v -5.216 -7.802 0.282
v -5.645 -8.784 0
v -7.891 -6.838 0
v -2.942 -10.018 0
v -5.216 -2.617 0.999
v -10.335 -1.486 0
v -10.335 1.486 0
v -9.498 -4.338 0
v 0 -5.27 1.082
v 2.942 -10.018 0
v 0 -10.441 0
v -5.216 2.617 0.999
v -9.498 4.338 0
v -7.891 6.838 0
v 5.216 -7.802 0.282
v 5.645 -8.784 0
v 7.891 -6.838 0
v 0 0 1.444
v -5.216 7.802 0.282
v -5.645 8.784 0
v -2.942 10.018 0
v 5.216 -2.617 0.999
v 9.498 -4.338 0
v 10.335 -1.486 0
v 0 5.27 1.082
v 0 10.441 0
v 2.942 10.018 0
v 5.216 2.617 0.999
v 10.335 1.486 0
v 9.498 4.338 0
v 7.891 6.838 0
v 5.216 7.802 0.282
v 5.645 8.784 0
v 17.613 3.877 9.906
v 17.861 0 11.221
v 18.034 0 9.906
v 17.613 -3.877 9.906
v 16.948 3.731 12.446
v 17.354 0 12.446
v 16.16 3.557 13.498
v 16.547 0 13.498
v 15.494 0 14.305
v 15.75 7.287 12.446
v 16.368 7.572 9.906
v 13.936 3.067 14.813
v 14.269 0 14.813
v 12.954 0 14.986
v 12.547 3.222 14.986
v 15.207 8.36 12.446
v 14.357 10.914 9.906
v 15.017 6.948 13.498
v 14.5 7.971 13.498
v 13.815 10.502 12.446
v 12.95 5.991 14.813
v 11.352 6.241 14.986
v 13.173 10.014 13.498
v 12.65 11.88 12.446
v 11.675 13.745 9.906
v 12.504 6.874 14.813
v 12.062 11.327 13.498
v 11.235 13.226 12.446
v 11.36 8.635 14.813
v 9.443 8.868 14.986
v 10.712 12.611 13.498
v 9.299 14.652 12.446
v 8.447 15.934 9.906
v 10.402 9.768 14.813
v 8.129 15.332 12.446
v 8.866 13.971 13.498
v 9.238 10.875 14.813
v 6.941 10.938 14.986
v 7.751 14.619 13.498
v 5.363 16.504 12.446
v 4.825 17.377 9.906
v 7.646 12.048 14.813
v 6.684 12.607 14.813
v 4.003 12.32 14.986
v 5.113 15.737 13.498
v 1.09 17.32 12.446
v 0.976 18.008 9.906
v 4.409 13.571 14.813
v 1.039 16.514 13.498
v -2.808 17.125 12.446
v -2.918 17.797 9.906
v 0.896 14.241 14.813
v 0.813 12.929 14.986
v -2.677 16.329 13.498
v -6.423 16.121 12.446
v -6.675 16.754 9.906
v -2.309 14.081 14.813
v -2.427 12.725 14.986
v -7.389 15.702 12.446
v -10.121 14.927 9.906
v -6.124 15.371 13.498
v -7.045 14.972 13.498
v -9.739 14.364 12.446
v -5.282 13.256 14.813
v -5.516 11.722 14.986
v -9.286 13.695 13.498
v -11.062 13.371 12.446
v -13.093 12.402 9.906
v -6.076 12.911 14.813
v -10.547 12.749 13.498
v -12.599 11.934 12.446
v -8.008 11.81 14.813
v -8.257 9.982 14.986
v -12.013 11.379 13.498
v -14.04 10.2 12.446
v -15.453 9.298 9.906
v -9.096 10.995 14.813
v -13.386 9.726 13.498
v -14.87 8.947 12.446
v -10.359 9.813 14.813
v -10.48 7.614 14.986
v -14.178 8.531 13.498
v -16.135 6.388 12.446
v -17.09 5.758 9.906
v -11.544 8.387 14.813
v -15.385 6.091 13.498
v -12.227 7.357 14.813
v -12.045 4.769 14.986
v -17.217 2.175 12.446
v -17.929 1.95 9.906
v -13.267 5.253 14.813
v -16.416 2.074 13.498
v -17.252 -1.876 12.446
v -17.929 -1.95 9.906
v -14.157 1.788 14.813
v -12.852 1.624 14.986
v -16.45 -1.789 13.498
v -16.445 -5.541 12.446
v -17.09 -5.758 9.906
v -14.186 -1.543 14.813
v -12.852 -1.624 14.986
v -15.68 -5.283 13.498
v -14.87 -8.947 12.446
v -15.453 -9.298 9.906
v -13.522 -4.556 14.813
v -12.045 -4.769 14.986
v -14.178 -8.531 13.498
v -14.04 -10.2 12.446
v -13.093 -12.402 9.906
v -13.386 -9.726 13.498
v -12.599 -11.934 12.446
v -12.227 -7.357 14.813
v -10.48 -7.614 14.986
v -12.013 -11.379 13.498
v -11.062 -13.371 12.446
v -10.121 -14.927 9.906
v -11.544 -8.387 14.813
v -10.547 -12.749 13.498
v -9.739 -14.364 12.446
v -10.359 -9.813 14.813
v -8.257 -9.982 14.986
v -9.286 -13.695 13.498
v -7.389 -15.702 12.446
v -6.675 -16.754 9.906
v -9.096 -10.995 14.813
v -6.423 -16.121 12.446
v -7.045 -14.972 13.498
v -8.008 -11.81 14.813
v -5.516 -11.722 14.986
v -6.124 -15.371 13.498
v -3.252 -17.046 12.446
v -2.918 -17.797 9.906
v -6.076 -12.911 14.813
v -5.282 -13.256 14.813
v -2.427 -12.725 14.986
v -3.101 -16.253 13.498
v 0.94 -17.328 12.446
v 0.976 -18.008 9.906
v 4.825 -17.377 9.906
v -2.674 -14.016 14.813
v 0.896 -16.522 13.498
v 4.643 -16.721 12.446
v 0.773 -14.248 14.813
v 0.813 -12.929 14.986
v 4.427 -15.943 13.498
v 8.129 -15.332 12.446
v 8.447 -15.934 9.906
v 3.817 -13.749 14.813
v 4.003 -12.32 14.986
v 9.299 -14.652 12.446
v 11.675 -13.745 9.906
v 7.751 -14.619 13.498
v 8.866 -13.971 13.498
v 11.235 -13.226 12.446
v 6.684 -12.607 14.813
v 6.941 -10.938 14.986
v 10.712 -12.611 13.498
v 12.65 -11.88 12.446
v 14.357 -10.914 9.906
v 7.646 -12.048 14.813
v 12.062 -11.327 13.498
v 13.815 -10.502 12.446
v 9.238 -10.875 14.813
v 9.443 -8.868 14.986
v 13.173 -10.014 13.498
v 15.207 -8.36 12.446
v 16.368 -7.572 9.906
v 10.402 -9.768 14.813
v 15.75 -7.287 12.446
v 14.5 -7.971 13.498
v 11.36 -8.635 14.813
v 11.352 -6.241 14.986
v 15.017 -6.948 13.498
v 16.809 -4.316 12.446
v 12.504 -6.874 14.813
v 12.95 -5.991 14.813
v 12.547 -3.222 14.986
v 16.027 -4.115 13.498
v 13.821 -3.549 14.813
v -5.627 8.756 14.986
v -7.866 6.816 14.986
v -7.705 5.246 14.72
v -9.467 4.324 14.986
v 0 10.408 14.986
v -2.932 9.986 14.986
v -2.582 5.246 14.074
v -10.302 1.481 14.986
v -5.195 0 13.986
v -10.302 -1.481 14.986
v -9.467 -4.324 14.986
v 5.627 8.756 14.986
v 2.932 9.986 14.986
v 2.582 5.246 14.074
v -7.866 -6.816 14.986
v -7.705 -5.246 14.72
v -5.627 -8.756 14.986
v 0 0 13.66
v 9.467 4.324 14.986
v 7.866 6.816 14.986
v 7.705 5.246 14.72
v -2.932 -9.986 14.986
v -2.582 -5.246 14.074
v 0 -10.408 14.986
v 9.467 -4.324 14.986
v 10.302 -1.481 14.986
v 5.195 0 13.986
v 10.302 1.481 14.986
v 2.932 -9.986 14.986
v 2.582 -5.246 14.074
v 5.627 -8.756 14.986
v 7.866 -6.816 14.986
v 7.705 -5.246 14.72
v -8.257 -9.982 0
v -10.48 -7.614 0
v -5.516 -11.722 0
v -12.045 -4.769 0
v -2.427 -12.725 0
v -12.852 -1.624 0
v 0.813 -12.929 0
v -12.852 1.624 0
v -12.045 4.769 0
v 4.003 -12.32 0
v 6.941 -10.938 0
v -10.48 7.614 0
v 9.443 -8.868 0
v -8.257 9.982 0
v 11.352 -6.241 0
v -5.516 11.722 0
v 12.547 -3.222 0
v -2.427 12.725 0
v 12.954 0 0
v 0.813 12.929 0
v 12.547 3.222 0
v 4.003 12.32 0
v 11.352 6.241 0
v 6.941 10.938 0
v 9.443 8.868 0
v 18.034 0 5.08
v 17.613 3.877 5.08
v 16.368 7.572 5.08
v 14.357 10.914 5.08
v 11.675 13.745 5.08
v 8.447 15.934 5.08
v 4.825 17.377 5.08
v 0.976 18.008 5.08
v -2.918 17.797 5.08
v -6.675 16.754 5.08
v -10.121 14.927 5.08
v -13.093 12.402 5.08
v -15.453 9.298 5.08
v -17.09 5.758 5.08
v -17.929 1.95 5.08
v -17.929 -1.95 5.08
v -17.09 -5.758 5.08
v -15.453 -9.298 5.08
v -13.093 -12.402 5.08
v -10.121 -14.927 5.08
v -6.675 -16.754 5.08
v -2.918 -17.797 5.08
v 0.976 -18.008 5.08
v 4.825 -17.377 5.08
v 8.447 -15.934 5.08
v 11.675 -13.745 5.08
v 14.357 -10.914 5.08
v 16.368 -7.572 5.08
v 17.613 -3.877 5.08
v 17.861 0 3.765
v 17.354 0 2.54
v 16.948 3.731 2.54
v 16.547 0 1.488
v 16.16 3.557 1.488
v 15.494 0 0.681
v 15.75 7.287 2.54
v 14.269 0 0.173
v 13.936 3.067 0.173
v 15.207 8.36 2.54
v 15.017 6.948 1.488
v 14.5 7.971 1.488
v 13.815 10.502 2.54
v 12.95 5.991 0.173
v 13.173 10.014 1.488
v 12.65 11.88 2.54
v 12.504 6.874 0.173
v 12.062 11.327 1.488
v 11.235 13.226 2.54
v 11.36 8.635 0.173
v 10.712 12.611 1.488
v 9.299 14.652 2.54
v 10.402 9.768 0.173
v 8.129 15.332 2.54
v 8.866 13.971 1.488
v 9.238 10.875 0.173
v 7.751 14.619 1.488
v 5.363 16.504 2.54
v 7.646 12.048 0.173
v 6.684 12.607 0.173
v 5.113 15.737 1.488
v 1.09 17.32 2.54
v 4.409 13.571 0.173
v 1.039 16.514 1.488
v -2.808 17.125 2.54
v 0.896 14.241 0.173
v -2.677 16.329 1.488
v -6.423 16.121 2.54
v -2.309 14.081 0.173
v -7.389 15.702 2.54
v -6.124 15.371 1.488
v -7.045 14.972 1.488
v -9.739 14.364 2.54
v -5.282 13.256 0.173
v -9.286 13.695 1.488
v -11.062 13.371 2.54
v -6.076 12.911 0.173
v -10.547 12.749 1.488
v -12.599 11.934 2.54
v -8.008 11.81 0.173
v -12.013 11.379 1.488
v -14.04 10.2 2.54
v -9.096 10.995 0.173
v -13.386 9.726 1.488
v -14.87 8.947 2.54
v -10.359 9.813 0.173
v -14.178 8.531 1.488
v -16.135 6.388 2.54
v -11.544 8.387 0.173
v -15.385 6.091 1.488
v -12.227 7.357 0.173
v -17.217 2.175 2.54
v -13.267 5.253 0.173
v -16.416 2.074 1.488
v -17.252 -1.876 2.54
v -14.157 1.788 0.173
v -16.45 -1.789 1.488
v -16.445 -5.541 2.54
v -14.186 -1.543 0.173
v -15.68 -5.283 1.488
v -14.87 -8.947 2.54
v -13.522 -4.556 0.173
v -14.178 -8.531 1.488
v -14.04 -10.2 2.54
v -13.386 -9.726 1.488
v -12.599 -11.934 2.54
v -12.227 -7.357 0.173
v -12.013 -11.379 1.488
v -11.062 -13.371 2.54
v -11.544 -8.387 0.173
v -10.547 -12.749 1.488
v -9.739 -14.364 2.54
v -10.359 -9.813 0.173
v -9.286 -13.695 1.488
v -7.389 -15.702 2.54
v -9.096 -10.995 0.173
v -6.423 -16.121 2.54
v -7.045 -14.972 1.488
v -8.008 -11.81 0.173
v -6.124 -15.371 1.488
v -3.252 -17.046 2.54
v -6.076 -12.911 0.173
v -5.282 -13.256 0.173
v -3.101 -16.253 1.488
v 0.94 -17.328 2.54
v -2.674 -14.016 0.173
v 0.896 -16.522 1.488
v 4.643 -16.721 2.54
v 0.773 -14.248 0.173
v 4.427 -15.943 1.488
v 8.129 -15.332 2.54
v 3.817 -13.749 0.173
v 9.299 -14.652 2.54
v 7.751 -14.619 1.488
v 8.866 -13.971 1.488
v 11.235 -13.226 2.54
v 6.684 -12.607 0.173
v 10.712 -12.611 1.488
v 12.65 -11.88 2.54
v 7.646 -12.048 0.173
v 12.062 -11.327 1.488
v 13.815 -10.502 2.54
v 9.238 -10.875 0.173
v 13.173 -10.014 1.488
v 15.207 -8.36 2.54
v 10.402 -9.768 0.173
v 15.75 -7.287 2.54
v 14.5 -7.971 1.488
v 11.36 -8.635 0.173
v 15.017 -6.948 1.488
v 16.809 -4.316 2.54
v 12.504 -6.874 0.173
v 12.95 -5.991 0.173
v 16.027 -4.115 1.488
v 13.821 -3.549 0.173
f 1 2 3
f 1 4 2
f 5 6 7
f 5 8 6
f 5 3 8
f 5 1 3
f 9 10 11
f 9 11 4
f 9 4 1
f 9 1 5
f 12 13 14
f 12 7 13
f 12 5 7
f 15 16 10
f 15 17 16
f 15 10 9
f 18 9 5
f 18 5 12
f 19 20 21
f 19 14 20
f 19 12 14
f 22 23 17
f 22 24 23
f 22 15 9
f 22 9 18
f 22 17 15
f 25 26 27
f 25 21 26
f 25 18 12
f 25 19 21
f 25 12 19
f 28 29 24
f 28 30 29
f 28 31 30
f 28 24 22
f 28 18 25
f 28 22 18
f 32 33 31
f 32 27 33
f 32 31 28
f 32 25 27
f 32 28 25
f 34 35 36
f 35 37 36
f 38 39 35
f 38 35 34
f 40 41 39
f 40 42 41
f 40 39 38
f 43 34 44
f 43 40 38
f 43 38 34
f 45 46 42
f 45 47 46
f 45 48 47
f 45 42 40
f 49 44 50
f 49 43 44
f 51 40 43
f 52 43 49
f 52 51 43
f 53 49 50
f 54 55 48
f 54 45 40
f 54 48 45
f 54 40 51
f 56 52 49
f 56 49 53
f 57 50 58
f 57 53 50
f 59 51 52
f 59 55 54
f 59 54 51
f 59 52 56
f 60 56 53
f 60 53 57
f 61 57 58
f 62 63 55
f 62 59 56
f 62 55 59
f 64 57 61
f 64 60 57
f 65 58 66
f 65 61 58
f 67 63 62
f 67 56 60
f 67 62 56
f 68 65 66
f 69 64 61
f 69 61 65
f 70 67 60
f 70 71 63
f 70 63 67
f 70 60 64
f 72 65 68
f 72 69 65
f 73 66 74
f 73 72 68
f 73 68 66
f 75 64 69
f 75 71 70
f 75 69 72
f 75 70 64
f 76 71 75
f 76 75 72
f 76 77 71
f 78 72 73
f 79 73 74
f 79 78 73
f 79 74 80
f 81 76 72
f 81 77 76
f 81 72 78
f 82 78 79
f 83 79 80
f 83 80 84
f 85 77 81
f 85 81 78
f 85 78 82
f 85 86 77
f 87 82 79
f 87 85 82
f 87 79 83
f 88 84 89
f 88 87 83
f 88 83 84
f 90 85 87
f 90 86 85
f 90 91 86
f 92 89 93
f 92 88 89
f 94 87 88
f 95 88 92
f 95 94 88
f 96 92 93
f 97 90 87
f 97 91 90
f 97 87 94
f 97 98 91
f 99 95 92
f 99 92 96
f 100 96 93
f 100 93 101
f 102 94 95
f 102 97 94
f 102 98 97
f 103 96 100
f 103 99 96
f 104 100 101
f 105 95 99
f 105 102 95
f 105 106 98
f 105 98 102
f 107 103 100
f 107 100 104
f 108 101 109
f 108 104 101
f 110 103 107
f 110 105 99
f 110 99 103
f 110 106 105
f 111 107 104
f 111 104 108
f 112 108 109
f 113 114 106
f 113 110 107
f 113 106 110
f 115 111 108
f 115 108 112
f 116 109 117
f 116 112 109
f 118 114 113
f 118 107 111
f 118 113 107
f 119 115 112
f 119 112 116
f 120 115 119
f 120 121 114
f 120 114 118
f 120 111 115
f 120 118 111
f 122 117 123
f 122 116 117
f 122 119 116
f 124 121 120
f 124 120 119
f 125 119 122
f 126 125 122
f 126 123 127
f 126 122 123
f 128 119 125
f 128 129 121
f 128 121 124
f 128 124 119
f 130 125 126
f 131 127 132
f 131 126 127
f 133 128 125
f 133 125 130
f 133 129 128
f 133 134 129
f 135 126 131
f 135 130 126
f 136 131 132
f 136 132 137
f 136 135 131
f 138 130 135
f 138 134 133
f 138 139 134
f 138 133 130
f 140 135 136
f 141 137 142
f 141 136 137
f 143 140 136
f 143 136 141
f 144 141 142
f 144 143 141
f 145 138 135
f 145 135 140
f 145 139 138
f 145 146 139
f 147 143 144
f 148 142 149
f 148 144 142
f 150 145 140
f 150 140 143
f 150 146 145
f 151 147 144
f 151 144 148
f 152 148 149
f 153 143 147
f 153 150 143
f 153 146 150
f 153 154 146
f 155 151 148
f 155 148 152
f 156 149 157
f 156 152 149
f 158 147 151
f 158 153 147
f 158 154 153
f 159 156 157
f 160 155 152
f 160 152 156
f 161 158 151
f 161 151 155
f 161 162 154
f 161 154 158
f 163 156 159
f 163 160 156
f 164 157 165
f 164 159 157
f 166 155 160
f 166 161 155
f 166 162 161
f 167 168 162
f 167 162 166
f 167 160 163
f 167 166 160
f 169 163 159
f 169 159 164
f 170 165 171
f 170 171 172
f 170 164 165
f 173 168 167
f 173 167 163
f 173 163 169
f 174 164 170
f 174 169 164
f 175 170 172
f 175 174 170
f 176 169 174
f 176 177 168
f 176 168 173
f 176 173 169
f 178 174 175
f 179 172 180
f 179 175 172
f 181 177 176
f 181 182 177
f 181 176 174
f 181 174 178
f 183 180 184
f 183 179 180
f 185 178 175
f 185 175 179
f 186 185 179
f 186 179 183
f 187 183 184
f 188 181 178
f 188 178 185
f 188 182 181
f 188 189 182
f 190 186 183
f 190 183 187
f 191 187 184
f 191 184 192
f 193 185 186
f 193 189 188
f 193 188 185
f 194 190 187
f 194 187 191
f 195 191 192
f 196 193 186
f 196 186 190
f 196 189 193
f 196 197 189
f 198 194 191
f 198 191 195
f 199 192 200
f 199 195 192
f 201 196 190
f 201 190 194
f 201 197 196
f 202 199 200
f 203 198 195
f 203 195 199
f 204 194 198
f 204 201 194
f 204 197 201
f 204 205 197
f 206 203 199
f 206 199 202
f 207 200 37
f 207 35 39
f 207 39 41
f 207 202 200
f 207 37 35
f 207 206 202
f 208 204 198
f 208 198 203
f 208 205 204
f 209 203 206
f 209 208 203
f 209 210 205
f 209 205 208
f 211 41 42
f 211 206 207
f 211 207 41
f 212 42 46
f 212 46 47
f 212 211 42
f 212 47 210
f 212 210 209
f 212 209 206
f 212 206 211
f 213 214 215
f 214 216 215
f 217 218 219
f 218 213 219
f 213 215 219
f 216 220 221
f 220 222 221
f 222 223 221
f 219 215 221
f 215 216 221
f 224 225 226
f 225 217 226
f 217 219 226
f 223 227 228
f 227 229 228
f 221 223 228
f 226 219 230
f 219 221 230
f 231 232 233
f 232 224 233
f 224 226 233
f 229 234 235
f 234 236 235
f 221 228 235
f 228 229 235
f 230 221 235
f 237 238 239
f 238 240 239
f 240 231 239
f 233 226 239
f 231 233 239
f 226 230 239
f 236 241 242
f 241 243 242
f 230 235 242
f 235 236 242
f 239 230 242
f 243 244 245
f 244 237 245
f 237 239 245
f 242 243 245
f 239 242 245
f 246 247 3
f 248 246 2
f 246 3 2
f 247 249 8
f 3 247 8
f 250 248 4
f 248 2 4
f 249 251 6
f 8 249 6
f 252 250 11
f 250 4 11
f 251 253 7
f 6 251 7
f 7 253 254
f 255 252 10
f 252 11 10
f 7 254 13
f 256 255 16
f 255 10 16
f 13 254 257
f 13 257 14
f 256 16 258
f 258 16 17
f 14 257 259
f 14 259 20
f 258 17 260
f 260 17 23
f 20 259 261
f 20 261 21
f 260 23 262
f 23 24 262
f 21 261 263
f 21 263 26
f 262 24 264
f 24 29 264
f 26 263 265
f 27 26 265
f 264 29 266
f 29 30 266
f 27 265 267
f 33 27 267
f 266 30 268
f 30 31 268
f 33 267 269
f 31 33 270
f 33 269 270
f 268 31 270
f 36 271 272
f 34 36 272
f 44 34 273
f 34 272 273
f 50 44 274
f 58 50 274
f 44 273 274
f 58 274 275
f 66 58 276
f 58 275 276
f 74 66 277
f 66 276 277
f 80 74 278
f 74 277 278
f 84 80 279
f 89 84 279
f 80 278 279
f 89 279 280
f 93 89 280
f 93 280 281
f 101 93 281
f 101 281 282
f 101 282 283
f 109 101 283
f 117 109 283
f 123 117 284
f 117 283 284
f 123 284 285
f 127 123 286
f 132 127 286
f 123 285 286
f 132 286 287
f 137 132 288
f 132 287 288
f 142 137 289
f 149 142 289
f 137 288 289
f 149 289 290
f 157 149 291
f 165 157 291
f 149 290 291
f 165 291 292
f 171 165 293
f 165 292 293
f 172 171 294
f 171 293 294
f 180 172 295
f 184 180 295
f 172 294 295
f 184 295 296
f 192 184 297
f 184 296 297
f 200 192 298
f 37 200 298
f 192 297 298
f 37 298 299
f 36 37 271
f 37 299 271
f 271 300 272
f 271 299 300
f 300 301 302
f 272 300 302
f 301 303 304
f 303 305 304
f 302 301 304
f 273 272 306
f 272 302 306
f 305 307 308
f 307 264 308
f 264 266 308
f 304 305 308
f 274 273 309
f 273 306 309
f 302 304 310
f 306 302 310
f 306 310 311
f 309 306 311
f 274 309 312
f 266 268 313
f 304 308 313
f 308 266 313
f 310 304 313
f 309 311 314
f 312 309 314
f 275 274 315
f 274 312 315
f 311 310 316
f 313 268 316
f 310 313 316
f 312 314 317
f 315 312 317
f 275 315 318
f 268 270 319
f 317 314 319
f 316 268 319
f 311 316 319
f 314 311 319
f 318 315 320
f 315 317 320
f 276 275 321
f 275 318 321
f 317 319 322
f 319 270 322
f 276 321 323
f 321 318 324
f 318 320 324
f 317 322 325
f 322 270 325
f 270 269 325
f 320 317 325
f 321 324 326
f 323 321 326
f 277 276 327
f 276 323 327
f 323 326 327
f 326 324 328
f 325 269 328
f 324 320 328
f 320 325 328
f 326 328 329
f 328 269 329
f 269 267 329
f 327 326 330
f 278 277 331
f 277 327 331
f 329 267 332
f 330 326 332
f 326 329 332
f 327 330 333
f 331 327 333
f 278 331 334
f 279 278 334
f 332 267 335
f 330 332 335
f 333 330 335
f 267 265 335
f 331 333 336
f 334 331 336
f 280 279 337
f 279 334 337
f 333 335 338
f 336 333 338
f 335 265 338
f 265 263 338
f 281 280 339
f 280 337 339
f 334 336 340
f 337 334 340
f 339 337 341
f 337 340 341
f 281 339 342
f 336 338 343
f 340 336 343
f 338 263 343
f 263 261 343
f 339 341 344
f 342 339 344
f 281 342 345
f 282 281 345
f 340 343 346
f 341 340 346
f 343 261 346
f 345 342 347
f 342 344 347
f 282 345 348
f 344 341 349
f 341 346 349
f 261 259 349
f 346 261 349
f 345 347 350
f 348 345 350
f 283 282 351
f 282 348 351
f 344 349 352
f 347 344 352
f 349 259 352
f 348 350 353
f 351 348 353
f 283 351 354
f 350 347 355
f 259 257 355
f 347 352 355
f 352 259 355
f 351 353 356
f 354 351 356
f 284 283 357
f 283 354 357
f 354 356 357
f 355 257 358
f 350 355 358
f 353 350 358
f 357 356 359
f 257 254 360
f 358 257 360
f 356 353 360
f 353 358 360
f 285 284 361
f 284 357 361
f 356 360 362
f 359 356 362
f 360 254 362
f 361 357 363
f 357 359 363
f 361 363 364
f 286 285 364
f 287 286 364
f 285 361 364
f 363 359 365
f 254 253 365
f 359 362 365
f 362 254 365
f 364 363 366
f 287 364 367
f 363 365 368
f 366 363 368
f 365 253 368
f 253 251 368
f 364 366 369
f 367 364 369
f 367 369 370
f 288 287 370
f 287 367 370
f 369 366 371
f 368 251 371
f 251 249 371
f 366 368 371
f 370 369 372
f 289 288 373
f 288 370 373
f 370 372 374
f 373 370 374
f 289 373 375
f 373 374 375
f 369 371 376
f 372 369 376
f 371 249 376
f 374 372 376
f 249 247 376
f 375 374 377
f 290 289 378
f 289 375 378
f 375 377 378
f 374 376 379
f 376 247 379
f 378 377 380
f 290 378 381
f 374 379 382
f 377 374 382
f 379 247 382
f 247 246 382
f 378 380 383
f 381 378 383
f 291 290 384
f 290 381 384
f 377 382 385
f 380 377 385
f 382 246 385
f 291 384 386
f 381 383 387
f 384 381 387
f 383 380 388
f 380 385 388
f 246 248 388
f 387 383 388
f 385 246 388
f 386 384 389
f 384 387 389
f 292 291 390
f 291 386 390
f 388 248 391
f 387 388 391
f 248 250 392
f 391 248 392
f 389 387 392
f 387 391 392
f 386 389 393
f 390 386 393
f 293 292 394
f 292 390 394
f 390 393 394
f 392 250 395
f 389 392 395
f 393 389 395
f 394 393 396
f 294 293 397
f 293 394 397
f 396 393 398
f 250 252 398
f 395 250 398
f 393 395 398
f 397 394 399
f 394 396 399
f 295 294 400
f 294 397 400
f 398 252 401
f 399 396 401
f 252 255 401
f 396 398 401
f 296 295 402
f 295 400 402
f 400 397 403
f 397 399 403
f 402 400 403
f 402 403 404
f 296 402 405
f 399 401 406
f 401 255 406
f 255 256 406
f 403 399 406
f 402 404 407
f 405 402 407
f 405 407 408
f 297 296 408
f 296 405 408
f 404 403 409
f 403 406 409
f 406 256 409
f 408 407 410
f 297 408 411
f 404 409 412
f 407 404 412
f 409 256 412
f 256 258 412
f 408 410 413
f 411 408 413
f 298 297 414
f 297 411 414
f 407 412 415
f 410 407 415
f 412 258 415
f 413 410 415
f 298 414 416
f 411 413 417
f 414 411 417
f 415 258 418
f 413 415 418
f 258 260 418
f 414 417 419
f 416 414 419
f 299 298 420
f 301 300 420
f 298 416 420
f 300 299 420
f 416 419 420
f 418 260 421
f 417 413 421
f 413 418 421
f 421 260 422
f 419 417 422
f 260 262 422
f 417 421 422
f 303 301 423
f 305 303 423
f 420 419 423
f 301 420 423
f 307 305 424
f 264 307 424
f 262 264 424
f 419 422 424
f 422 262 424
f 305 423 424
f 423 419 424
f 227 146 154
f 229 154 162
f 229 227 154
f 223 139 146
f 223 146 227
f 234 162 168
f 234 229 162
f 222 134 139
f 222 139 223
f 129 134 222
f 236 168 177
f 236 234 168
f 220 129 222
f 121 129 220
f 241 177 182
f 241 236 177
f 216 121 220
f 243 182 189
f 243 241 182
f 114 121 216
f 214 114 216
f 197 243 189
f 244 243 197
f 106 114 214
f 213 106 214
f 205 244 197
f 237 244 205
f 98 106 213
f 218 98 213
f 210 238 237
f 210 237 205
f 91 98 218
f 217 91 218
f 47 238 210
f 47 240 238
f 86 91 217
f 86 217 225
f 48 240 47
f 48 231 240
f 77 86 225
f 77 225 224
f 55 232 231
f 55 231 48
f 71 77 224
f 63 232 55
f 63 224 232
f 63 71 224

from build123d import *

# Parameters (mm, degrees)
F0_R     = 18.034415
F1_DEPTH = 14.986
F2_R     = 5.08


with BuildPart() as f1:
    # F0 (on Top) → F1 (new body)
    with BuildSketch(Plane.XY):
        Circle(F0_R)
    extrude(amount=F1_DEPTH)

    # F2
    f2_edges = [f1.edges().sort_by_distance(p)[0] for p in [
        (18.034415, 0, 7.493),
        (-18.034415, 0, 0),
        (-18.034415, 0, 14.986),
    ]]
    fillet(f2_edges, radius=F2_R)

    # F3 (on Right) → F4 (revolve, cut)
    with BuildSketch(Plane.YZ):
        with BuildLine():
            Line((-41.504344, 55.164188), (41.504344, 55.164188))
            ThreePointArc((41.504344, 55.164188), (0, 96.668532), (-41.504344, 55.164188))
        make_face()
    revolve(axis=Axis((0, 0.253545, 55.164188), (0, -1, 0)), mode=Mode.SUBTRACT)

    # F5 (on Front) → F6 (revolve, cut)
    with BuildSketch(Plane.XZ):
        with BuildLine():
            ThreePointArc((-38.461781, -37.017379), (0, -75.47916), (38.461781, -37.017379))
            Line((38.461781, -37.017379), (-38.461781, -37.017379))
        make_face()
    revolve(axis=Axis((1.748852, 0, -37.017379), (-1, 0, 0)), mode=Mode.SUBTRACT)


solid = f1.part
